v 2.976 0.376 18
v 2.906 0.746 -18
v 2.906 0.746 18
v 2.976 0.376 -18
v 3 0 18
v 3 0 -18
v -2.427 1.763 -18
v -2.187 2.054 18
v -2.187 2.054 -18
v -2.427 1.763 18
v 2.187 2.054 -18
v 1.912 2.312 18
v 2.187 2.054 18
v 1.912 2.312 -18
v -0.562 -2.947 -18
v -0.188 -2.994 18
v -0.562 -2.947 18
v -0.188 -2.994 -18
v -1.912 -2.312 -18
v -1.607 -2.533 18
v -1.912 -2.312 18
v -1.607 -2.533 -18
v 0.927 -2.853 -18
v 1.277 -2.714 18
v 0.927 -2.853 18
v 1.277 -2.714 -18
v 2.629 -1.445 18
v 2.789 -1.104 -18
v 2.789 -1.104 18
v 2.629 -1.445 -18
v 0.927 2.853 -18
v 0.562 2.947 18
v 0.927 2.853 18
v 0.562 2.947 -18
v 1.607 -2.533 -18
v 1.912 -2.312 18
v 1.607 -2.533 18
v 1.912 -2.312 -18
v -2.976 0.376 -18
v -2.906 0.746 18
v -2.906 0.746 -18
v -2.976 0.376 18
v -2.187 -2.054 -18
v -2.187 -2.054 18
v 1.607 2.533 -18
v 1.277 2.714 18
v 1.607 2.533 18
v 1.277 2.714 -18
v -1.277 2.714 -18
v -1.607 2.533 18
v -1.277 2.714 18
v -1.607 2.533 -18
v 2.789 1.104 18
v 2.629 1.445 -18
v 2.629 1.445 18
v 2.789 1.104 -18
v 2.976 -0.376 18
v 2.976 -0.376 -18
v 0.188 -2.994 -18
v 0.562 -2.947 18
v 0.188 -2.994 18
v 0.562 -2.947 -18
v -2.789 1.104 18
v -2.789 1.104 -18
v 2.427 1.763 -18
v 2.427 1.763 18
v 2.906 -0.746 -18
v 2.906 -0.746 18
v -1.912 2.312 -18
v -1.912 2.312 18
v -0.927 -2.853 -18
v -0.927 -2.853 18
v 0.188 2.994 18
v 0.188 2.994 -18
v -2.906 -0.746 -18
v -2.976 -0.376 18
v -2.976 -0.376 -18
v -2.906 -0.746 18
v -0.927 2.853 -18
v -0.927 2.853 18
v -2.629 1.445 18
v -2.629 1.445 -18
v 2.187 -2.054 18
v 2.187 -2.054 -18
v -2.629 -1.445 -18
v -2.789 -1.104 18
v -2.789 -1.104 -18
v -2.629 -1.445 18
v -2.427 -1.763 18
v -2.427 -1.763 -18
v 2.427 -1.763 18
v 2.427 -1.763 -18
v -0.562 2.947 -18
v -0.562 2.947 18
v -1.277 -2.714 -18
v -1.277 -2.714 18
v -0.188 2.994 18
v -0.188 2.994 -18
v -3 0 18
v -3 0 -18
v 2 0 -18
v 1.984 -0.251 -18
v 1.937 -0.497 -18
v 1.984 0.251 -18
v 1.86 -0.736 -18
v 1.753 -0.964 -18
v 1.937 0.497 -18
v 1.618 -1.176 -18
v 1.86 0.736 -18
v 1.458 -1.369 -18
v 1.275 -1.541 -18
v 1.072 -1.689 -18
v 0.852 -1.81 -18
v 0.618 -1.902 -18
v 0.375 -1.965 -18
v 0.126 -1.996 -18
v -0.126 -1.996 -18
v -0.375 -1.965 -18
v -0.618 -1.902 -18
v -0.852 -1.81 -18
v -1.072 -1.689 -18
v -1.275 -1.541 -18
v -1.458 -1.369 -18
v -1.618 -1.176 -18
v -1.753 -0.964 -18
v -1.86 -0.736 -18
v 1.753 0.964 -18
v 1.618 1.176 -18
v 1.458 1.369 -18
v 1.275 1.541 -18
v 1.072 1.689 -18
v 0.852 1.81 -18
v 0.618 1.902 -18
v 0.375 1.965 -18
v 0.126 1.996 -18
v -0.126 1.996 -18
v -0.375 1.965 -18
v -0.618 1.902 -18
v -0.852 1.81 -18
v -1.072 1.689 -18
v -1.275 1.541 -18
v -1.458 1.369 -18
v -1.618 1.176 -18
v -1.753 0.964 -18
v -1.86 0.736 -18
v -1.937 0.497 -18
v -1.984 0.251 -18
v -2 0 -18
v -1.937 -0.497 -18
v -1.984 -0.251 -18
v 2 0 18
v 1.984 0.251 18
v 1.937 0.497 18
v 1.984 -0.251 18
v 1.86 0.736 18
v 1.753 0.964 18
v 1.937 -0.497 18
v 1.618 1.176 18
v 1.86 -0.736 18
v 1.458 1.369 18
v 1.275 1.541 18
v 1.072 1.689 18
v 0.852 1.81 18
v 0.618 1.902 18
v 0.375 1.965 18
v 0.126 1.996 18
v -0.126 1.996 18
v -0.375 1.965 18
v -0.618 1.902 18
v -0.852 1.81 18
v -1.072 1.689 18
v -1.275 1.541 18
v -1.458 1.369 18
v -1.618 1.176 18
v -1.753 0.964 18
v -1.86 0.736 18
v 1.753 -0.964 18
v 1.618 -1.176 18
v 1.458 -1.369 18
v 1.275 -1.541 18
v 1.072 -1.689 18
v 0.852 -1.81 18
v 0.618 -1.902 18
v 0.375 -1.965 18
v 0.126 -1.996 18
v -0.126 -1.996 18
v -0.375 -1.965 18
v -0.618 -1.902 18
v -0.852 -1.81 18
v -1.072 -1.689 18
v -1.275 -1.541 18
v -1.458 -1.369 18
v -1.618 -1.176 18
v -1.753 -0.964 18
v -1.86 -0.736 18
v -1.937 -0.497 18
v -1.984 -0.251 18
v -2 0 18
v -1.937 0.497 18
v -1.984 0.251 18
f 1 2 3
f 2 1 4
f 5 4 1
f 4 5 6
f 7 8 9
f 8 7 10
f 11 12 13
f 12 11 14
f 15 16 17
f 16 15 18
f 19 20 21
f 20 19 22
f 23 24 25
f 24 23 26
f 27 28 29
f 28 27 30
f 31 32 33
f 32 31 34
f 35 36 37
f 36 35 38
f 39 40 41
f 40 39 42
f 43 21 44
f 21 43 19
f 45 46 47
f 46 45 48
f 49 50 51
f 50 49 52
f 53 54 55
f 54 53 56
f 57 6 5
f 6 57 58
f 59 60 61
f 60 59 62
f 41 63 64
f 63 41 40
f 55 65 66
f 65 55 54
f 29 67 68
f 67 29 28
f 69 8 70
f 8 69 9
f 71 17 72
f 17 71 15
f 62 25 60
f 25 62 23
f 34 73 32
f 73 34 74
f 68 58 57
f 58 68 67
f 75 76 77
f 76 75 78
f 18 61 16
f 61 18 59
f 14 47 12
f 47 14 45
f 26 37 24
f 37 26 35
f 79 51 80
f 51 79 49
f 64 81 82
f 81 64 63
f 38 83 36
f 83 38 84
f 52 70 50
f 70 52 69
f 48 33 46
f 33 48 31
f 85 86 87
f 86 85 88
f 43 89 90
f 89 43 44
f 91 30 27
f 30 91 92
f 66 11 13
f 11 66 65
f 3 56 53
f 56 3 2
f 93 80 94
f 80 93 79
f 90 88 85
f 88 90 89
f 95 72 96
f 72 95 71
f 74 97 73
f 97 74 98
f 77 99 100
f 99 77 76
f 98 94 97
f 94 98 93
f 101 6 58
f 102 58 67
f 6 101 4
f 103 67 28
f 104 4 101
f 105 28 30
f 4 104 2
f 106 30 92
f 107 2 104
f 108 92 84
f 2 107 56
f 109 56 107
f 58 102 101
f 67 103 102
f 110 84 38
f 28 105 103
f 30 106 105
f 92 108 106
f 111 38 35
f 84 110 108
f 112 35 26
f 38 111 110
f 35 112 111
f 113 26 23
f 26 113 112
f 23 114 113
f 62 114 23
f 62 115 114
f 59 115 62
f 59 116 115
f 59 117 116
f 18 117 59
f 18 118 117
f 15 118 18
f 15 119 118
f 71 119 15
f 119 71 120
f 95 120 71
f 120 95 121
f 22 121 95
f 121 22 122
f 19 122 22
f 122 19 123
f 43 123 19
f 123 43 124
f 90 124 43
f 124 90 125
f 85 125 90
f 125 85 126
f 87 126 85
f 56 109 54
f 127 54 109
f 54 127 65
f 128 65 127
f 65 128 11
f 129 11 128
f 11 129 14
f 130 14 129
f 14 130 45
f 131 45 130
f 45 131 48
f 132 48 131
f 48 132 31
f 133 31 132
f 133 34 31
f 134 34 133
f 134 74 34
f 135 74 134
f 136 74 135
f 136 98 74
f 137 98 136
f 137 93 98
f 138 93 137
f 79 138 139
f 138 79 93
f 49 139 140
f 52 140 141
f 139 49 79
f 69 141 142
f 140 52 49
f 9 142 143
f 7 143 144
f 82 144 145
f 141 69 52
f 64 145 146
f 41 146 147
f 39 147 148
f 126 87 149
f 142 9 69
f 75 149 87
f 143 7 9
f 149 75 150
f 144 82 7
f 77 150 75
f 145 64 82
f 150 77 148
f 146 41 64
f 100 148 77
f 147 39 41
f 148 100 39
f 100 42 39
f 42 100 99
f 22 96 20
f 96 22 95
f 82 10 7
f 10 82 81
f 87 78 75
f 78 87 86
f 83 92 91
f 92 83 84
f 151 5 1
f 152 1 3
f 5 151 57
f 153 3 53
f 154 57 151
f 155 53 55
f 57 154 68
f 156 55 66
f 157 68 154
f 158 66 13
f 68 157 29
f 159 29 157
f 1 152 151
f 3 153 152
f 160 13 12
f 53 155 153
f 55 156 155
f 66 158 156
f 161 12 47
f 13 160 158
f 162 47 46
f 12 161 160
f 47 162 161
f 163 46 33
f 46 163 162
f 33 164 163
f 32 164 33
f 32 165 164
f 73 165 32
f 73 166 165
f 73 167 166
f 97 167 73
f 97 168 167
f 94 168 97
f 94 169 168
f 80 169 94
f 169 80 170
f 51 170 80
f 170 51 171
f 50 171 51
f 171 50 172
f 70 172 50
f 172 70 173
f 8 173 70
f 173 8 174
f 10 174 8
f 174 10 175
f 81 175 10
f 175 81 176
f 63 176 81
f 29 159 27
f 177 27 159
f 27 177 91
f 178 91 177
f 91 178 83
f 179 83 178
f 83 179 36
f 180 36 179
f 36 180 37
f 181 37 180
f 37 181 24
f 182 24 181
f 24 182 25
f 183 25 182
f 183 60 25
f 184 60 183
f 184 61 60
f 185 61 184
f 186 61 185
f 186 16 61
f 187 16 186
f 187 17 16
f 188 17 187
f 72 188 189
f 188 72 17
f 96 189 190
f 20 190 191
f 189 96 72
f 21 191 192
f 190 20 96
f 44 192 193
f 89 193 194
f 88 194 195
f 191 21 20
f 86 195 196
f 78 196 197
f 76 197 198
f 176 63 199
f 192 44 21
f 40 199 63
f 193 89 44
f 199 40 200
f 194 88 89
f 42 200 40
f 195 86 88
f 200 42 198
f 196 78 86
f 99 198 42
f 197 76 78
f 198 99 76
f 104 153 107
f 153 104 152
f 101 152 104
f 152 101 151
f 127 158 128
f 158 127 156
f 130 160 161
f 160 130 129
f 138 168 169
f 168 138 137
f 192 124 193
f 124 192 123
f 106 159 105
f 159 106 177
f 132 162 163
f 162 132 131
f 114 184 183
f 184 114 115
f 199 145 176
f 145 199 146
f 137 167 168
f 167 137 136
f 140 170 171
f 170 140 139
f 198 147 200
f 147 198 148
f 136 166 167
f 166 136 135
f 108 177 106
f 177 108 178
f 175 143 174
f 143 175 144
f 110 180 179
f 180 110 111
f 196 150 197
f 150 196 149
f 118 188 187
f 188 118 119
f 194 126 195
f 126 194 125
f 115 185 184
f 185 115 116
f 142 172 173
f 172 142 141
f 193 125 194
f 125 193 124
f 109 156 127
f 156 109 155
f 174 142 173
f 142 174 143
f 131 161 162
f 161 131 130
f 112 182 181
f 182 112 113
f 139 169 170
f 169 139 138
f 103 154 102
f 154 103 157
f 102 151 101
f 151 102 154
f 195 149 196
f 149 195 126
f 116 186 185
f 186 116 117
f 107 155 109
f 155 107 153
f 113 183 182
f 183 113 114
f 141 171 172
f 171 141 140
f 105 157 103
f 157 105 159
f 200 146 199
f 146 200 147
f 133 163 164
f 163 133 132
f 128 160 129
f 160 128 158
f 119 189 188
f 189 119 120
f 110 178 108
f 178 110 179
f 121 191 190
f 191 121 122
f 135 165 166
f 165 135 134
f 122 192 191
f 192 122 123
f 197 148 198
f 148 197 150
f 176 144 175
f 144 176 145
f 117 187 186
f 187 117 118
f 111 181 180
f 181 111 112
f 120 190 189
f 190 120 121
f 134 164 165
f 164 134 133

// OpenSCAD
$fn = 50;


difference() {
	union() {
		translate(v = [0, 0, -18.0000000000]) {
			cylinder(h = 36, r = 3.0000000000);
		}
	}
	union() {
		translate(v = [0, 0, -100.0000000000]) {
			cylinder(h = 200, r = 2.0000000000);
		}
	}
}
